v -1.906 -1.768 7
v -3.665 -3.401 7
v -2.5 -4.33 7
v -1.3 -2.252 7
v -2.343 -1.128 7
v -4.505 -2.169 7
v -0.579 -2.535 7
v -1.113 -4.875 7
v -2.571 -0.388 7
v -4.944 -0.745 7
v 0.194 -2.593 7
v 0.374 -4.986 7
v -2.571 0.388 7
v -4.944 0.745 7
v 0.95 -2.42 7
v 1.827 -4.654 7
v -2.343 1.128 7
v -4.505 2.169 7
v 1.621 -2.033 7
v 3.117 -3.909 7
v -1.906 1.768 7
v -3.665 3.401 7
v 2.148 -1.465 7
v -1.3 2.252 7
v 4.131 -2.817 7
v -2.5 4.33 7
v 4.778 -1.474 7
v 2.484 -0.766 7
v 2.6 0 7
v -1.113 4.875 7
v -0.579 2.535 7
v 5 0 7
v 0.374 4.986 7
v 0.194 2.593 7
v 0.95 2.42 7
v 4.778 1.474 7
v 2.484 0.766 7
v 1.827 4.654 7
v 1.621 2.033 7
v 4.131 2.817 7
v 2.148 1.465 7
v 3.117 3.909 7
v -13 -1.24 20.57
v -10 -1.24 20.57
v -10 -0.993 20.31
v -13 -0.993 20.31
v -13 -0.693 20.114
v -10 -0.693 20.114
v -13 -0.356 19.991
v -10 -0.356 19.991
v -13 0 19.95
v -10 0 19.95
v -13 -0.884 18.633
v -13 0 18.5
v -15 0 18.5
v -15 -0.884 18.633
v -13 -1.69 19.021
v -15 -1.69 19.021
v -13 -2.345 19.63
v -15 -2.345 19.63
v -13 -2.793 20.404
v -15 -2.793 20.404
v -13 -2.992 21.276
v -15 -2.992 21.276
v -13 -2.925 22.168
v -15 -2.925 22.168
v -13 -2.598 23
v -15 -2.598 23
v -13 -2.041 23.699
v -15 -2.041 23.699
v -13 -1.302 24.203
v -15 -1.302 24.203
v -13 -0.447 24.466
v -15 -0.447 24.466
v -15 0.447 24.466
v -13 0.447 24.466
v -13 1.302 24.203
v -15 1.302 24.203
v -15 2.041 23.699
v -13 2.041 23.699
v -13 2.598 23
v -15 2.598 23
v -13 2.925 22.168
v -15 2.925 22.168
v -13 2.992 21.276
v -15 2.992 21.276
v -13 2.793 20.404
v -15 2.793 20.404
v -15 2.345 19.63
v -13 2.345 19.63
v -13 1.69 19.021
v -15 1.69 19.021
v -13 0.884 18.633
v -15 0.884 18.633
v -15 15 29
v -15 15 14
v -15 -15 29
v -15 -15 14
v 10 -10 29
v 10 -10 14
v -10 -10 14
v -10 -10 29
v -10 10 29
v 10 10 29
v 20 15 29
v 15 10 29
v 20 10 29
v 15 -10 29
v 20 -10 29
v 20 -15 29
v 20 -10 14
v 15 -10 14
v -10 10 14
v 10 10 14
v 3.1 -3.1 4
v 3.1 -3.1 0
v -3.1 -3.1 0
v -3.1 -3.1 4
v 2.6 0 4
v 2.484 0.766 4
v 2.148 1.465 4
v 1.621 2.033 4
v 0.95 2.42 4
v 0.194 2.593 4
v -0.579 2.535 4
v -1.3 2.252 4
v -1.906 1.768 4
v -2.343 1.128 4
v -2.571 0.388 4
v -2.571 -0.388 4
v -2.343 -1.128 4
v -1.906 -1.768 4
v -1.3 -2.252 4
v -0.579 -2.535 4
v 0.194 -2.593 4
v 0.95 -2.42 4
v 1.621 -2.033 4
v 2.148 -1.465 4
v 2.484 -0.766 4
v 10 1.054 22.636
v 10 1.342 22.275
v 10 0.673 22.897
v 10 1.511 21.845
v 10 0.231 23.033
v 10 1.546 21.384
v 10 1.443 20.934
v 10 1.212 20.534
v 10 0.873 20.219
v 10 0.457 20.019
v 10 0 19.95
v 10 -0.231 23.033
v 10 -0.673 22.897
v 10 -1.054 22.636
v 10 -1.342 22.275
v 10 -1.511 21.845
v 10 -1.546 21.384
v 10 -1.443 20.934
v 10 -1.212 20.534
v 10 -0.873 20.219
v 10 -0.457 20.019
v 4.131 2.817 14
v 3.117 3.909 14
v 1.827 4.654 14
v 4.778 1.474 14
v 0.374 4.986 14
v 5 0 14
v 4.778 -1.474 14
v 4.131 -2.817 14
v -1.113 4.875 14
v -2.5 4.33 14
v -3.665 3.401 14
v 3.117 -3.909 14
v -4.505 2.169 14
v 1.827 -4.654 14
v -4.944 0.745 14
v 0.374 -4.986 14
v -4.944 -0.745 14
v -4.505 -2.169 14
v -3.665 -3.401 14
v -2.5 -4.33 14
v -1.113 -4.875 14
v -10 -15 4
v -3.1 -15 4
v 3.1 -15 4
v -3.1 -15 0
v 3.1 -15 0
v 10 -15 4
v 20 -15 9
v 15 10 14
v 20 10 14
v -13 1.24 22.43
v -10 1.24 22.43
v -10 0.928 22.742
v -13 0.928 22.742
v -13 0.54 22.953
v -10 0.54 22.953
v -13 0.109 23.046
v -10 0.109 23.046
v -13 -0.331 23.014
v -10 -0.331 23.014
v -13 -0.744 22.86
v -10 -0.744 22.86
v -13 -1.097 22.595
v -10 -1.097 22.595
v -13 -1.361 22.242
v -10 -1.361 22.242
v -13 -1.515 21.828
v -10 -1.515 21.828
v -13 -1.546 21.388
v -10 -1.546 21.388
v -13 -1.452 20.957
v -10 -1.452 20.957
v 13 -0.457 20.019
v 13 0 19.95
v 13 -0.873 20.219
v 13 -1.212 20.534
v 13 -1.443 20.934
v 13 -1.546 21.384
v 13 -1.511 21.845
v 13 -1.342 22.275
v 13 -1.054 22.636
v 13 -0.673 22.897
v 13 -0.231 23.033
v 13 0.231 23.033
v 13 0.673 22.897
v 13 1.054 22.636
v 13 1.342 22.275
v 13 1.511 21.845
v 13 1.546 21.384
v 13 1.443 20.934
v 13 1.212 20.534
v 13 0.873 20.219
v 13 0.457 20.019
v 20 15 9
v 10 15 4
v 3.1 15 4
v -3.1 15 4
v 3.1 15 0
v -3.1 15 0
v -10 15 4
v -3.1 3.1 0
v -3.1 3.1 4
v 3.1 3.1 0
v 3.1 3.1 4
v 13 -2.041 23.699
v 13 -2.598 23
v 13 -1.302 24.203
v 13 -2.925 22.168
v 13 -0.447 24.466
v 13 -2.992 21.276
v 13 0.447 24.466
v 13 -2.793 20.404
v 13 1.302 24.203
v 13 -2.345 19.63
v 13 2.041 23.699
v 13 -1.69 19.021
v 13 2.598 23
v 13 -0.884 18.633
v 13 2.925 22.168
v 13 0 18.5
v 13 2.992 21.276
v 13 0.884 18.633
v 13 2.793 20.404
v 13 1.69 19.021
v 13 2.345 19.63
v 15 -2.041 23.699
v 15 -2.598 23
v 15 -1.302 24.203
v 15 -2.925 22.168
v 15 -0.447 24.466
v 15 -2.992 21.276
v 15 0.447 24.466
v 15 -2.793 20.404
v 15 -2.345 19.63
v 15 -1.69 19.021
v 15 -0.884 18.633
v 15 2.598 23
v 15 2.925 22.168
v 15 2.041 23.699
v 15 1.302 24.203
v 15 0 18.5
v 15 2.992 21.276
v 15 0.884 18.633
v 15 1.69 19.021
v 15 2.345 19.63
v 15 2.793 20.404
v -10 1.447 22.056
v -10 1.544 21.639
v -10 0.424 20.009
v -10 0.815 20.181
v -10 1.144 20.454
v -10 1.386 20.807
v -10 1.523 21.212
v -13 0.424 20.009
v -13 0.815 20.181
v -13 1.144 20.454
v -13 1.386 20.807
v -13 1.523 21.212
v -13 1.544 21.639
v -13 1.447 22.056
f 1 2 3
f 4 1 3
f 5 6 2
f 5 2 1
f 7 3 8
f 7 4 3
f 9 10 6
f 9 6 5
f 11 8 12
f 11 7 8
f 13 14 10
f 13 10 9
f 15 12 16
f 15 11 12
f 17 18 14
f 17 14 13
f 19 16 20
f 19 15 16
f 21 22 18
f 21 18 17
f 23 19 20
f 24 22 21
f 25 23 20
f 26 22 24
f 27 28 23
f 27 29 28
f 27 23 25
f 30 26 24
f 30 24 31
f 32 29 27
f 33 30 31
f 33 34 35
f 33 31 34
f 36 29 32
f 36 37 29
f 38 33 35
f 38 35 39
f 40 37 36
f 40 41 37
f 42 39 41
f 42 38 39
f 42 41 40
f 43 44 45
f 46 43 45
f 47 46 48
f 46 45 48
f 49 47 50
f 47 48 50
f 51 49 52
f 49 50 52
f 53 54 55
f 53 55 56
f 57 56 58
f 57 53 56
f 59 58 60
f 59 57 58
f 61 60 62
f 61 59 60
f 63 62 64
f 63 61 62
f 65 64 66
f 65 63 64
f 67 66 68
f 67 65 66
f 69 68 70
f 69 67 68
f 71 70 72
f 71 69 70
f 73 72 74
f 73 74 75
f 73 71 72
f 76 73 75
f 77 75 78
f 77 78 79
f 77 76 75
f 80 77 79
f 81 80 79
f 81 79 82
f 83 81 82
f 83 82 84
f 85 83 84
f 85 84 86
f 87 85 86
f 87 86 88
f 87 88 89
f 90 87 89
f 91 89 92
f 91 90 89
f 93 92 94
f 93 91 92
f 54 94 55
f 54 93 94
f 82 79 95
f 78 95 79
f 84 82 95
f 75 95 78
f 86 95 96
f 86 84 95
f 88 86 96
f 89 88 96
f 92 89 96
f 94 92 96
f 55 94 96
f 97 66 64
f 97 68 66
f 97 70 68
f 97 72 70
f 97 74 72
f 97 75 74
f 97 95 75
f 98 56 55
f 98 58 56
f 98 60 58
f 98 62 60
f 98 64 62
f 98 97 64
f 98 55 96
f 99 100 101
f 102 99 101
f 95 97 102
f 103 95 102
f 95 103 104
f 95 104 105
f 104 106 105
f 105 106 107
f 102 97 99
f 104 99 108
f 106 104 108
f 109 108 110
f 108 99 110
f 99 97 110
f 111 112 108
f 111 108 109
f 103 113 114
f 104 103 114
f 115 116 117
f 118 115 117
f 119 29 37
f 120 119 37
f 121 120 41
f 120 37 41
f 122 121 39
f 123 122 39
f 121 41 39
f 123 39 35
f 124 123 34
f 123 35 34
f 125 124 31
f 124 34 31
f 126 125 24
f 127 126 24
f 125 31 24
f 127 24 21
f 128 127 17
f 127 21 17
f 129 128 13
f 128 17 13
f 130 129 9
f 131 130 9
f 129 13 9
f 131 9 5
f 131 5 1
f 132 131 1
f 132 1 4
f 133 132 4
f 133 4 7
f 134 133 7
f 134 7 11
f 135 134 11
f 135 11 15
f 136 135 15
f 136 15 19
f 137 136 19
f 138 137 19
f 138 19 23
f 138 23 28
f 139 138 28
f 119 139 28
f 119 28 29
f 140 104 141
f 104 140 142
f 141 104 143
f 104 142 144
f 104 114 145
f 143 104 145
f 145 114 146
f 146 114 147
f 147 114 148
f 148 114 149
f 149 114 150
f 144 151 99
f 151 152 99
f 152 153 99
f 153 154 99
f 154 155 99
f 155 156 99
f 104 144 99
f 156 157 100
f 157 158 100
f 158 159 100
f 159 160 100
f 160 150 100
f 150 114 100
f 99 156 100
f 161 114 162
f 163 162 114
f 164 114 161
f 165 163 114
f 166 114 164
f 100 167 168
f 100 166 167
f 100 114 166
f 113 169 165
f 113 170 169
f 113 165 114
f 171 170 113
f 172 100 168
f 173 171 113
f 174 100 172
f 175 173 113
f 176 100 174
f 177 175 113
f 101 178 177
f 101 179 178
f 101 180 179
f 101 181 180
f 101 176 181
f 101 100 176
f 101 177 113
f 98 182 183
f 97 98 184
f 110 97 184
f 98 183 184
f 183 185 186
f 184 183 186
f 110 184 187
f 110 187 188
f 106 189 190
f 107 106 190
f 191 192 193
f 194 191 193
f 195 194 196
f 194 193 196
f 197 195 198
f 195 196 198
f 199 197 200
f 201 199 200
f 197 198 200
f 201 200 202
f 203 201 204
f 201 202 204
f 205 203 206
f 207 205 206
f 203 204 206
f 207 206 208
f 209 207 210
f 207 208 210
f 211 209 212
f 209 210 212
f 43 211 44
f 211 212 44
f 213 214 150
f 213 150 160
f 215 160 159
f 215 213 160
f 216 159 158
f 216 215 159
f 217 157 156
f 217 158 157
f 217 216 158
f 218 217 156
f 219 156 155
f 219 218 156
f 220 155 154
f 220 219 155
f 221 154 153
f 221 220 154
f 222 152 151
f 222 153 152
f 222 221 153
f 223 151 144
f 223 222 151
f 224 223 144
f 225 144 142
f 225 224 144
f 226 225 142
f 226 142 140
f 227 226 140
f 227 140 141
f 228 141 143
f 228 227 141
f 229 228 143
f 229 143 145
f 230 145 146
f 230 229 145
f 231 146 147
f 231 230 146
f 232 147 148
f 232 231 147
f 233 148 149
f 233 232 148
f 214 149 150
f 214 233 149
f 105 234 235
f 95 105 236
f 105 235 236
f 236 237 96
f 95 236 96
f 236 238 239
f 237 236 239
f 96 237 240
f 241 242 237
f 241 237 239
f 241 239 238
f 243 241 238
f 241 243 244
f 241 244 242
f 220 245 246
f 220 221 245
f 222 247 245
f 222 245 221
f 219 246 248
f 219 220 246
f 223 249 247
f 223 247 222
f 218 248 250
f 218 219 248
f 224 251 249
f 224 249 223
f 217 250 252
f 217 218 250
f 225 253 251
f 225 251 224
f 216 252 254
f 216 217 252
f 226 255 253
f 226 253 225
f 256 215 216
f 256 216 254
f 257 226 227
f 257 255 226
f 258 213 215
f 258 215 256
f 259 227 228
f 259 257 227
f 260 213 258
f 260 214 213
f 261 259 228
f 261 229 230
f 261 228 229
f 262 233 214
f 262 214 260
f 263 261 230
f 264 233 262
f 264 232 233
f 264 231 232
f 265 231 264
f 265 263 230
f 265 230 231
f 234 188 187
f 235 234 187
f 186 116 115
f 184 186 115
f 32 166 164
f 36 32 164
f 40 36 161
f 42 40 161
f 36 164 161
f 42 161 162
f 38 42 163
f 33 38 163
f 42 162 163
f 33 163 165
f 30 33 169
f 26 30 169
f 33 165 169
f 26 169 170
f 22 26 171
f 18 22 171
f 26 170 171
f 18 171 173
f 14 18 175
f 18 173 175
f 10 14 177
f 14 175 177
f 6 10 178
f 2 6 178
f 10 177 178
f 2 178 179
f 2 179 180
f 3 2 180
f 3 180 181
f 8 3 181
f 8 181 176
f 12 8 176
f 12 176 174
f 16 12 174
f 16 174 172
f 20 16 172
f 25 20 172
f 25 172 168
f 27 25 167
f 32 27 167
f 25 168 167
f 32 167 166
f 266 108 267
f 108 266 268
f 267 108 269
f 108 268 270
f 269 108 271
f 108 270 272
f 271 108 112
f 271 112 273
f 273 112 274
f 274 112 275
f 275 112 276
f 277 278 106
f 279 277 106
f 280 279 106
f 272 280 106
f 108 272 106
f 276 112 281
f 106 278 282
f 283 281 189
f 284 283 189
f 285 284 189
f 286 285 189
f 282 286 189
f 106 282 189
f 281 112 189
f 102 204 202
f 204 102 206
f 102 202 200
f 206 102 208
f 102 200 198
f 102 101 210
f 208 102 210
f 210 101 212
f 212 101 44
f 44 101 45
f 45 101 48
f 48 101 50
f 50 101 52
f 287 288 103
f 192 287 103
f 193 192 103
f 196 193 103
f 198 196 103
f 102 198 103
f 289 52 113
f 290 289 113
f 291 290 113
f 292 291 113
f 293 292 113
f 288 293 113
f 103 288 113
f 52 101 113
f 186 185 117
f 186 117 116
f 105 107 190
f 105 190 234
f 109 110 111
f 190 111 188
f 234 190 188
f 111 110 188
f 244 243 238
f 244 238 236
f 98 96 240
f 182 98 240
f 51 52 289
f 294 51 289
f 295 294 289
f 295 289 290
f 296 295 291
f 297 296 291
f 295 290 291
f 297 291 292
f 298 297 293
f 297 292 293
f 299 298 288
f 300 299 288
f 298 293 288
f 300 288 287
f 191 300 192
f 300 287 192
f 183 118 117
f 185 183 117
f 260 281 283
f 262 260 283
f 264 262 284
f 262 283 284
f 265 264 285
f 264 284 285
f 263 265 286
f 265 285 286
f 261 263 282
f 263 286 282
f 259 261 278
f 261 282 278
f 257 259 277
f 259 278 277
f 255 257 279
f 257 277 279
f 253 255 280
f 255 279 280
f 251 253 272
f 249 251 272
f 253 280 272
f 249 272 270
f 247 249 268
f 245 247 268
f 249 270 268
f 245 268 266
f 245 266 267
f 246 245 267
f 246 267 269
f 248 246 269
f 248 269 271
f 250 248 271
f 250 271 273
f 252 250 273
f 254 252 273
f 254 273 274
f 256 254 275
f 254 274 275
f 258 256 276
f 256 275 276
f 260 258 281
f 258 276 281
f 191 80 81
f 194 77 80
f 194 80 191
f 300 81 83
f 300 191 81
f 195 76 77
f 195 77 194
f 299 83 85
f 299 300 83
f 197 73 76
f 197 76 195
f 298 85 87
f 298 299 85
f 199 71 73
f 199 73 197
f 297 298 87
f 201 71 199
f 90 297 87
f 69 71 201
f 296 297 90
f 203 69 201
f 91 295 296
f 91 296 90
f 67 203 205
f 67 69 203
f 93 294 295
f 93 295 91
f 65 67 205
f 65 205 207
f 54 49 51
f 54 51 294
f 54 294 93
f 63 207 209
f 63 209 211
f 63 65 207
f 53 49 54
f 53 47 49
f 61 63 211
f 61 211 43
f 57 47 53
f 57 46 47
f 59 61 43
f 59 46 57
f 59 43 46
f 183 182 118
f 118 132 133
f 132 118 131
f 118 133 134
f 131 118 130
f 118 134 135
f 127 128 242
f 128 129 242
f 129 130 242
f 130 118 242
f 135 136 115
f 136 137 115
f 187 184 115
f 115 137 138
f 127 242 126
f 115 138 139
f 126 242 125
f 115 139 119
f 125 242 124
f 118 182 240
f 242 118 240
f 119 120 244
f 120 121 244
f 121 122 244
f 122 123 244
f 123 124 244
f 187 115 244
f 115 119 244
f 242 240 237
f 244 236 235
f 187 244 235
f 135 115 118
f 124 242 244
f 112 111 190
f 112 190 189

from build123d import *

# Parameters (mm, degrees)
EXTRUDE_1_DEPTH      = 14
CUT_EXTRUDE_1_DEPTH  = 44
SKETCH_3_W           = 6.2
SKETCH_3_H           = 6.2
CUT_EXTRUDE_2_DEPTH  = 4
SKETCH_4_R           = 4
CUT_EXTRUDE_3_DEPTH  = 5
SKETCH_5_R           = 2.6
CUT_EXTRUDE_4_DEPTH  = 5
EXTRUDE_2_DEPTH      = 44
SKETCH_8_W           = 5
SKETCH_8_H           = 5
EXTRUDE_4_DEPTH      = 15
SKETCH_9_W           = 35
SKETCH_9_H           = 5
EXTRUDE_5_DEPTH      = 7
CUT_EXTRUDE_6_DEPTH  = 10
CUT_EXTRUDE_START    = -30
SKETCH_14_R          = 1.55
CUT_EXTRUDE_7_DEPTH  = 30
SKETCH_15_R          = 3
CUT_EXTRUDE_8_DEPTH  = 2
CUT_EXTRUDE_START_2  = -2
SKETCH_16_R          = 3
CUT_EXTRUDE_9_DEPTH  = 2
SKETCH_17_W          = 35
SKETCH_17_H          = 7
CUT_EXTRUDE_10_DEPTH = 10
SKETCH_18_W          = 35
SKETCH_18_H          = 7
CUT_EXTRUDE_11_DEPTH = 20
SKETCH_19_R          = 5
CUT_EXTRUDE_12_DEPTH = 7


with BuildPart() as part:
    # 草图1 → 凸台-拉伸1 (new body)
    with BuildSketch(Plane.XY):
        Polygon((-15, 22), (-15, -22), (15, -22), (15, 22), (0, 22), align=None)
    extrude(amount=EXTRUDE_1_DEPTH)

    # 草图2 → 切除-拉伸1 (cut)
    with BuildSketch(Plane(origin=(0, 22, 0), x_dir=(1, 0, 0), z_dir=(0, 1, 0))):
        Polygon((-15, 0), (-15, -14), (-10, -4), (-3.1, -4), (-3.1, 0), align=None)
        Polygon((3.1, -4), (10, -4), (15, -14), (15, 0), (3.1, 0), align=None)
    extrude(amount=-CUT_EXTRUDE_1_DEPTH, mode=Mode.SUBTRACT)

    # 草图3 → 切除-拉伸2 (cut)
    with BuildSketch(Plane(origin=(0, 0, 0), x_dir=(-1, 0, 0), z_dir=(0, 0, -1))):
        Rectangle(SKETCH_3_W, SKETCH_3_H)
    extrude(amount=-CUT_EXTRUDE_2_DEPTH, mode=Mode.SUBTRACT)

    # 草图4 → 切除-拉伸3 (cut)
    with BuildSketch(Plane.XY.offset(14)):
        Circle(SKETCH_4_R)
    extrude(amount=-CUT_EXTRUDE_3_DEPTH, mode=Mode.SUBTRACT)

    # 草图5 → 切除-拉伸4 (cut)
    with BuildSketch(Plane.XY.offset(9)):
        Circle(SKETCH_5_R)
    extrude(amount=-CUT_EXTRUDE_4_DEPTH, mode=Mode.SUBTRACT)

    # 草图7 → 凸台-拉伸2 (add)
    with BuildSketch(Plane.XZ.offset(22)):
        Polygon((15, 14), (20, 14), (20, 9), (10, 4), (10, 14), align=None)
    extrude(amount=-EXTRUDE_2_DEPTH)

    # 草图8 → 凸台-拉伸4 (add)
    with BuildSketch(Plane.XY.offset(14)):
        with Locations((-12.5, -12.5)):
            Rectangle(SKETCH_8_W, SKETCH_8_H)
        Polygon((-10, -10), (-10, -15), (10, -15), (10, -10), (0, -10), align=None)
        Polygon((-10, 0), (-10, 10), (-15, 10), (-15, -10), (-10, -10), align=None)
        with Locations((-12.5, 12.5)):
            Rectangle(SKETCH_8_W, SKETCH_8_H)
        Polygon((-10, 15), (10, 15), (10, 10), (0, 10), (-10, 10), align=None)
        with Locations((12.5, 12.5)):
            Rectangle(SKETCH_8_W, SKETCH_8_H)
        Polygon((15, 10), (15, -10), (10, -10), (10, 0), (10, 10), align=None)
        with Locations((12.5, -12.5)):
            Rectangle(SKETCH_8_W, SKETCH_8_H)
        with Locations((17.5, -12.5)):
            Rectangle(SKETCH_8_W, SKETCH_8_H)
        with Locations((17.5, 12.5)):
            Rectangle(SKETCH_8_W, SKETCH_8_H)
    extrude(amount=EXTRUDE_4_DEPTH)

    # 草图9 → 凸台-拉伸5 (add)
    with BuildSketch(Plane(origin=(0, 15, 0), x_dir=(1, 0, 0), z_dir=(0, 1, 0))):
        with Locations((2.5, -26.5)):
            Rectangle(SKETCH_9_W, SKETCH_9_H)
    extrude(amount=EXTRUDE_5_DEPTH)

    # 草图13 → 切除-拉伸6 (cut)
    with BuildSketch(Plane(origin=(-10, 0, 0), x_dir=(0, 0, -1), z_dir=(1, 0, 0))):
        with BuildLine():
            ThreePointArc((-19.95, 0), (-20.806818927, 1.386362146), (-22.43, 1.24))
            Line((-22.43, 1.24), (-20.57, -1.24))
            ThreePointArc((-20.57, -1.24), (-20.113637854, -0.693181073), (-19.95, 0))
        make_face()
        with BuildLine():
            Line((-20.57, -1.24), (-22.43, 1.24))
            ThreePointArc((-22.43, 1.24), (-22.74, -0.93), (-20.57, -1.24))
        make_face()
    extrude(amount=-CUT_EXTRUDE_6_DEPTH, mode=Mode.SUBTRACT)

    # 草图14 → 切除-拉伸7 (cut)
    with BuildSketch(Plane.ZY.offset(15).offset(CUT_EXTRUDE_START)):
        with Locations(Location((21.5, 0, 0), (0, 0, 180))):
            Circle(SKETCH_14_R)
    extrude(amount=CUT_EXTRUDE_7_DEPTH, mode=Mode.SUBTRACT)

    # 草图15 → 切除-拉伸8 (cut)
    with BuildSketch(Plane(origin=(15, 0, 0), x_dir=(0, 0, -1), z_dir=(1, 0, 0))):
        with Locations((-21.5, 0)):
            Circle(SKETCH_15_R)
    extrude(amount=-CUT_EXTRUDE_8_DEPTH, mode=Mode.SUBTRACT)

    # 草图16 → 切除-拉伸9 (cut)
    with BuildSketch(Plane.ZY.offset(15).offset(CUT_EXTRUDE_START_2)):
        with Locations(Location((21.5, 0, 0), (0, 0, 180))):
            Circle(SKETCH_16_R)
    extrude(amount=CUT_EXTRUDE_9_DEPTH, mode=Mode.SUBTRACT)

    # 草图17 → 切除-拉伸10 (cut)
    with BuildSketch(Plane.XY.offset(29)):
        with Locations((2.5, 18.5)):
            Rectangle(SKETCH_17_W, SKETCH_17_H)
    extrude(amount=-CUT_EXTRUDE_10_DEPTH, mode=Mode.SUBTRACT)

    # 草图18 → 切除-拉伸11 (cut)
    with BuildSketch(Plane.XY.offset(14)):
        with Locations((2.5, 18.5)):
            Rectangle(SKETCH_18_W, SKETCH_18_H)
        with Locations((2.5, -18.5)):
            Rectangle(SKETCH_18_W, SKETCH_18_H)
    extrude(amount=-CUT_EXTRUDE_11_DEPTH, mode=Mode.SUBTRACT)

    # 草图19 → 切除-拉伸12 (cut)
    with BuildSketch(Plane.XY.offset(14)):
        Circle(SKETCH_19_R)
    extrude(amount=-CUT_EXTRUDE_12_DEPTH, mode=Mode.SUBTRACT)


solid = part.part
